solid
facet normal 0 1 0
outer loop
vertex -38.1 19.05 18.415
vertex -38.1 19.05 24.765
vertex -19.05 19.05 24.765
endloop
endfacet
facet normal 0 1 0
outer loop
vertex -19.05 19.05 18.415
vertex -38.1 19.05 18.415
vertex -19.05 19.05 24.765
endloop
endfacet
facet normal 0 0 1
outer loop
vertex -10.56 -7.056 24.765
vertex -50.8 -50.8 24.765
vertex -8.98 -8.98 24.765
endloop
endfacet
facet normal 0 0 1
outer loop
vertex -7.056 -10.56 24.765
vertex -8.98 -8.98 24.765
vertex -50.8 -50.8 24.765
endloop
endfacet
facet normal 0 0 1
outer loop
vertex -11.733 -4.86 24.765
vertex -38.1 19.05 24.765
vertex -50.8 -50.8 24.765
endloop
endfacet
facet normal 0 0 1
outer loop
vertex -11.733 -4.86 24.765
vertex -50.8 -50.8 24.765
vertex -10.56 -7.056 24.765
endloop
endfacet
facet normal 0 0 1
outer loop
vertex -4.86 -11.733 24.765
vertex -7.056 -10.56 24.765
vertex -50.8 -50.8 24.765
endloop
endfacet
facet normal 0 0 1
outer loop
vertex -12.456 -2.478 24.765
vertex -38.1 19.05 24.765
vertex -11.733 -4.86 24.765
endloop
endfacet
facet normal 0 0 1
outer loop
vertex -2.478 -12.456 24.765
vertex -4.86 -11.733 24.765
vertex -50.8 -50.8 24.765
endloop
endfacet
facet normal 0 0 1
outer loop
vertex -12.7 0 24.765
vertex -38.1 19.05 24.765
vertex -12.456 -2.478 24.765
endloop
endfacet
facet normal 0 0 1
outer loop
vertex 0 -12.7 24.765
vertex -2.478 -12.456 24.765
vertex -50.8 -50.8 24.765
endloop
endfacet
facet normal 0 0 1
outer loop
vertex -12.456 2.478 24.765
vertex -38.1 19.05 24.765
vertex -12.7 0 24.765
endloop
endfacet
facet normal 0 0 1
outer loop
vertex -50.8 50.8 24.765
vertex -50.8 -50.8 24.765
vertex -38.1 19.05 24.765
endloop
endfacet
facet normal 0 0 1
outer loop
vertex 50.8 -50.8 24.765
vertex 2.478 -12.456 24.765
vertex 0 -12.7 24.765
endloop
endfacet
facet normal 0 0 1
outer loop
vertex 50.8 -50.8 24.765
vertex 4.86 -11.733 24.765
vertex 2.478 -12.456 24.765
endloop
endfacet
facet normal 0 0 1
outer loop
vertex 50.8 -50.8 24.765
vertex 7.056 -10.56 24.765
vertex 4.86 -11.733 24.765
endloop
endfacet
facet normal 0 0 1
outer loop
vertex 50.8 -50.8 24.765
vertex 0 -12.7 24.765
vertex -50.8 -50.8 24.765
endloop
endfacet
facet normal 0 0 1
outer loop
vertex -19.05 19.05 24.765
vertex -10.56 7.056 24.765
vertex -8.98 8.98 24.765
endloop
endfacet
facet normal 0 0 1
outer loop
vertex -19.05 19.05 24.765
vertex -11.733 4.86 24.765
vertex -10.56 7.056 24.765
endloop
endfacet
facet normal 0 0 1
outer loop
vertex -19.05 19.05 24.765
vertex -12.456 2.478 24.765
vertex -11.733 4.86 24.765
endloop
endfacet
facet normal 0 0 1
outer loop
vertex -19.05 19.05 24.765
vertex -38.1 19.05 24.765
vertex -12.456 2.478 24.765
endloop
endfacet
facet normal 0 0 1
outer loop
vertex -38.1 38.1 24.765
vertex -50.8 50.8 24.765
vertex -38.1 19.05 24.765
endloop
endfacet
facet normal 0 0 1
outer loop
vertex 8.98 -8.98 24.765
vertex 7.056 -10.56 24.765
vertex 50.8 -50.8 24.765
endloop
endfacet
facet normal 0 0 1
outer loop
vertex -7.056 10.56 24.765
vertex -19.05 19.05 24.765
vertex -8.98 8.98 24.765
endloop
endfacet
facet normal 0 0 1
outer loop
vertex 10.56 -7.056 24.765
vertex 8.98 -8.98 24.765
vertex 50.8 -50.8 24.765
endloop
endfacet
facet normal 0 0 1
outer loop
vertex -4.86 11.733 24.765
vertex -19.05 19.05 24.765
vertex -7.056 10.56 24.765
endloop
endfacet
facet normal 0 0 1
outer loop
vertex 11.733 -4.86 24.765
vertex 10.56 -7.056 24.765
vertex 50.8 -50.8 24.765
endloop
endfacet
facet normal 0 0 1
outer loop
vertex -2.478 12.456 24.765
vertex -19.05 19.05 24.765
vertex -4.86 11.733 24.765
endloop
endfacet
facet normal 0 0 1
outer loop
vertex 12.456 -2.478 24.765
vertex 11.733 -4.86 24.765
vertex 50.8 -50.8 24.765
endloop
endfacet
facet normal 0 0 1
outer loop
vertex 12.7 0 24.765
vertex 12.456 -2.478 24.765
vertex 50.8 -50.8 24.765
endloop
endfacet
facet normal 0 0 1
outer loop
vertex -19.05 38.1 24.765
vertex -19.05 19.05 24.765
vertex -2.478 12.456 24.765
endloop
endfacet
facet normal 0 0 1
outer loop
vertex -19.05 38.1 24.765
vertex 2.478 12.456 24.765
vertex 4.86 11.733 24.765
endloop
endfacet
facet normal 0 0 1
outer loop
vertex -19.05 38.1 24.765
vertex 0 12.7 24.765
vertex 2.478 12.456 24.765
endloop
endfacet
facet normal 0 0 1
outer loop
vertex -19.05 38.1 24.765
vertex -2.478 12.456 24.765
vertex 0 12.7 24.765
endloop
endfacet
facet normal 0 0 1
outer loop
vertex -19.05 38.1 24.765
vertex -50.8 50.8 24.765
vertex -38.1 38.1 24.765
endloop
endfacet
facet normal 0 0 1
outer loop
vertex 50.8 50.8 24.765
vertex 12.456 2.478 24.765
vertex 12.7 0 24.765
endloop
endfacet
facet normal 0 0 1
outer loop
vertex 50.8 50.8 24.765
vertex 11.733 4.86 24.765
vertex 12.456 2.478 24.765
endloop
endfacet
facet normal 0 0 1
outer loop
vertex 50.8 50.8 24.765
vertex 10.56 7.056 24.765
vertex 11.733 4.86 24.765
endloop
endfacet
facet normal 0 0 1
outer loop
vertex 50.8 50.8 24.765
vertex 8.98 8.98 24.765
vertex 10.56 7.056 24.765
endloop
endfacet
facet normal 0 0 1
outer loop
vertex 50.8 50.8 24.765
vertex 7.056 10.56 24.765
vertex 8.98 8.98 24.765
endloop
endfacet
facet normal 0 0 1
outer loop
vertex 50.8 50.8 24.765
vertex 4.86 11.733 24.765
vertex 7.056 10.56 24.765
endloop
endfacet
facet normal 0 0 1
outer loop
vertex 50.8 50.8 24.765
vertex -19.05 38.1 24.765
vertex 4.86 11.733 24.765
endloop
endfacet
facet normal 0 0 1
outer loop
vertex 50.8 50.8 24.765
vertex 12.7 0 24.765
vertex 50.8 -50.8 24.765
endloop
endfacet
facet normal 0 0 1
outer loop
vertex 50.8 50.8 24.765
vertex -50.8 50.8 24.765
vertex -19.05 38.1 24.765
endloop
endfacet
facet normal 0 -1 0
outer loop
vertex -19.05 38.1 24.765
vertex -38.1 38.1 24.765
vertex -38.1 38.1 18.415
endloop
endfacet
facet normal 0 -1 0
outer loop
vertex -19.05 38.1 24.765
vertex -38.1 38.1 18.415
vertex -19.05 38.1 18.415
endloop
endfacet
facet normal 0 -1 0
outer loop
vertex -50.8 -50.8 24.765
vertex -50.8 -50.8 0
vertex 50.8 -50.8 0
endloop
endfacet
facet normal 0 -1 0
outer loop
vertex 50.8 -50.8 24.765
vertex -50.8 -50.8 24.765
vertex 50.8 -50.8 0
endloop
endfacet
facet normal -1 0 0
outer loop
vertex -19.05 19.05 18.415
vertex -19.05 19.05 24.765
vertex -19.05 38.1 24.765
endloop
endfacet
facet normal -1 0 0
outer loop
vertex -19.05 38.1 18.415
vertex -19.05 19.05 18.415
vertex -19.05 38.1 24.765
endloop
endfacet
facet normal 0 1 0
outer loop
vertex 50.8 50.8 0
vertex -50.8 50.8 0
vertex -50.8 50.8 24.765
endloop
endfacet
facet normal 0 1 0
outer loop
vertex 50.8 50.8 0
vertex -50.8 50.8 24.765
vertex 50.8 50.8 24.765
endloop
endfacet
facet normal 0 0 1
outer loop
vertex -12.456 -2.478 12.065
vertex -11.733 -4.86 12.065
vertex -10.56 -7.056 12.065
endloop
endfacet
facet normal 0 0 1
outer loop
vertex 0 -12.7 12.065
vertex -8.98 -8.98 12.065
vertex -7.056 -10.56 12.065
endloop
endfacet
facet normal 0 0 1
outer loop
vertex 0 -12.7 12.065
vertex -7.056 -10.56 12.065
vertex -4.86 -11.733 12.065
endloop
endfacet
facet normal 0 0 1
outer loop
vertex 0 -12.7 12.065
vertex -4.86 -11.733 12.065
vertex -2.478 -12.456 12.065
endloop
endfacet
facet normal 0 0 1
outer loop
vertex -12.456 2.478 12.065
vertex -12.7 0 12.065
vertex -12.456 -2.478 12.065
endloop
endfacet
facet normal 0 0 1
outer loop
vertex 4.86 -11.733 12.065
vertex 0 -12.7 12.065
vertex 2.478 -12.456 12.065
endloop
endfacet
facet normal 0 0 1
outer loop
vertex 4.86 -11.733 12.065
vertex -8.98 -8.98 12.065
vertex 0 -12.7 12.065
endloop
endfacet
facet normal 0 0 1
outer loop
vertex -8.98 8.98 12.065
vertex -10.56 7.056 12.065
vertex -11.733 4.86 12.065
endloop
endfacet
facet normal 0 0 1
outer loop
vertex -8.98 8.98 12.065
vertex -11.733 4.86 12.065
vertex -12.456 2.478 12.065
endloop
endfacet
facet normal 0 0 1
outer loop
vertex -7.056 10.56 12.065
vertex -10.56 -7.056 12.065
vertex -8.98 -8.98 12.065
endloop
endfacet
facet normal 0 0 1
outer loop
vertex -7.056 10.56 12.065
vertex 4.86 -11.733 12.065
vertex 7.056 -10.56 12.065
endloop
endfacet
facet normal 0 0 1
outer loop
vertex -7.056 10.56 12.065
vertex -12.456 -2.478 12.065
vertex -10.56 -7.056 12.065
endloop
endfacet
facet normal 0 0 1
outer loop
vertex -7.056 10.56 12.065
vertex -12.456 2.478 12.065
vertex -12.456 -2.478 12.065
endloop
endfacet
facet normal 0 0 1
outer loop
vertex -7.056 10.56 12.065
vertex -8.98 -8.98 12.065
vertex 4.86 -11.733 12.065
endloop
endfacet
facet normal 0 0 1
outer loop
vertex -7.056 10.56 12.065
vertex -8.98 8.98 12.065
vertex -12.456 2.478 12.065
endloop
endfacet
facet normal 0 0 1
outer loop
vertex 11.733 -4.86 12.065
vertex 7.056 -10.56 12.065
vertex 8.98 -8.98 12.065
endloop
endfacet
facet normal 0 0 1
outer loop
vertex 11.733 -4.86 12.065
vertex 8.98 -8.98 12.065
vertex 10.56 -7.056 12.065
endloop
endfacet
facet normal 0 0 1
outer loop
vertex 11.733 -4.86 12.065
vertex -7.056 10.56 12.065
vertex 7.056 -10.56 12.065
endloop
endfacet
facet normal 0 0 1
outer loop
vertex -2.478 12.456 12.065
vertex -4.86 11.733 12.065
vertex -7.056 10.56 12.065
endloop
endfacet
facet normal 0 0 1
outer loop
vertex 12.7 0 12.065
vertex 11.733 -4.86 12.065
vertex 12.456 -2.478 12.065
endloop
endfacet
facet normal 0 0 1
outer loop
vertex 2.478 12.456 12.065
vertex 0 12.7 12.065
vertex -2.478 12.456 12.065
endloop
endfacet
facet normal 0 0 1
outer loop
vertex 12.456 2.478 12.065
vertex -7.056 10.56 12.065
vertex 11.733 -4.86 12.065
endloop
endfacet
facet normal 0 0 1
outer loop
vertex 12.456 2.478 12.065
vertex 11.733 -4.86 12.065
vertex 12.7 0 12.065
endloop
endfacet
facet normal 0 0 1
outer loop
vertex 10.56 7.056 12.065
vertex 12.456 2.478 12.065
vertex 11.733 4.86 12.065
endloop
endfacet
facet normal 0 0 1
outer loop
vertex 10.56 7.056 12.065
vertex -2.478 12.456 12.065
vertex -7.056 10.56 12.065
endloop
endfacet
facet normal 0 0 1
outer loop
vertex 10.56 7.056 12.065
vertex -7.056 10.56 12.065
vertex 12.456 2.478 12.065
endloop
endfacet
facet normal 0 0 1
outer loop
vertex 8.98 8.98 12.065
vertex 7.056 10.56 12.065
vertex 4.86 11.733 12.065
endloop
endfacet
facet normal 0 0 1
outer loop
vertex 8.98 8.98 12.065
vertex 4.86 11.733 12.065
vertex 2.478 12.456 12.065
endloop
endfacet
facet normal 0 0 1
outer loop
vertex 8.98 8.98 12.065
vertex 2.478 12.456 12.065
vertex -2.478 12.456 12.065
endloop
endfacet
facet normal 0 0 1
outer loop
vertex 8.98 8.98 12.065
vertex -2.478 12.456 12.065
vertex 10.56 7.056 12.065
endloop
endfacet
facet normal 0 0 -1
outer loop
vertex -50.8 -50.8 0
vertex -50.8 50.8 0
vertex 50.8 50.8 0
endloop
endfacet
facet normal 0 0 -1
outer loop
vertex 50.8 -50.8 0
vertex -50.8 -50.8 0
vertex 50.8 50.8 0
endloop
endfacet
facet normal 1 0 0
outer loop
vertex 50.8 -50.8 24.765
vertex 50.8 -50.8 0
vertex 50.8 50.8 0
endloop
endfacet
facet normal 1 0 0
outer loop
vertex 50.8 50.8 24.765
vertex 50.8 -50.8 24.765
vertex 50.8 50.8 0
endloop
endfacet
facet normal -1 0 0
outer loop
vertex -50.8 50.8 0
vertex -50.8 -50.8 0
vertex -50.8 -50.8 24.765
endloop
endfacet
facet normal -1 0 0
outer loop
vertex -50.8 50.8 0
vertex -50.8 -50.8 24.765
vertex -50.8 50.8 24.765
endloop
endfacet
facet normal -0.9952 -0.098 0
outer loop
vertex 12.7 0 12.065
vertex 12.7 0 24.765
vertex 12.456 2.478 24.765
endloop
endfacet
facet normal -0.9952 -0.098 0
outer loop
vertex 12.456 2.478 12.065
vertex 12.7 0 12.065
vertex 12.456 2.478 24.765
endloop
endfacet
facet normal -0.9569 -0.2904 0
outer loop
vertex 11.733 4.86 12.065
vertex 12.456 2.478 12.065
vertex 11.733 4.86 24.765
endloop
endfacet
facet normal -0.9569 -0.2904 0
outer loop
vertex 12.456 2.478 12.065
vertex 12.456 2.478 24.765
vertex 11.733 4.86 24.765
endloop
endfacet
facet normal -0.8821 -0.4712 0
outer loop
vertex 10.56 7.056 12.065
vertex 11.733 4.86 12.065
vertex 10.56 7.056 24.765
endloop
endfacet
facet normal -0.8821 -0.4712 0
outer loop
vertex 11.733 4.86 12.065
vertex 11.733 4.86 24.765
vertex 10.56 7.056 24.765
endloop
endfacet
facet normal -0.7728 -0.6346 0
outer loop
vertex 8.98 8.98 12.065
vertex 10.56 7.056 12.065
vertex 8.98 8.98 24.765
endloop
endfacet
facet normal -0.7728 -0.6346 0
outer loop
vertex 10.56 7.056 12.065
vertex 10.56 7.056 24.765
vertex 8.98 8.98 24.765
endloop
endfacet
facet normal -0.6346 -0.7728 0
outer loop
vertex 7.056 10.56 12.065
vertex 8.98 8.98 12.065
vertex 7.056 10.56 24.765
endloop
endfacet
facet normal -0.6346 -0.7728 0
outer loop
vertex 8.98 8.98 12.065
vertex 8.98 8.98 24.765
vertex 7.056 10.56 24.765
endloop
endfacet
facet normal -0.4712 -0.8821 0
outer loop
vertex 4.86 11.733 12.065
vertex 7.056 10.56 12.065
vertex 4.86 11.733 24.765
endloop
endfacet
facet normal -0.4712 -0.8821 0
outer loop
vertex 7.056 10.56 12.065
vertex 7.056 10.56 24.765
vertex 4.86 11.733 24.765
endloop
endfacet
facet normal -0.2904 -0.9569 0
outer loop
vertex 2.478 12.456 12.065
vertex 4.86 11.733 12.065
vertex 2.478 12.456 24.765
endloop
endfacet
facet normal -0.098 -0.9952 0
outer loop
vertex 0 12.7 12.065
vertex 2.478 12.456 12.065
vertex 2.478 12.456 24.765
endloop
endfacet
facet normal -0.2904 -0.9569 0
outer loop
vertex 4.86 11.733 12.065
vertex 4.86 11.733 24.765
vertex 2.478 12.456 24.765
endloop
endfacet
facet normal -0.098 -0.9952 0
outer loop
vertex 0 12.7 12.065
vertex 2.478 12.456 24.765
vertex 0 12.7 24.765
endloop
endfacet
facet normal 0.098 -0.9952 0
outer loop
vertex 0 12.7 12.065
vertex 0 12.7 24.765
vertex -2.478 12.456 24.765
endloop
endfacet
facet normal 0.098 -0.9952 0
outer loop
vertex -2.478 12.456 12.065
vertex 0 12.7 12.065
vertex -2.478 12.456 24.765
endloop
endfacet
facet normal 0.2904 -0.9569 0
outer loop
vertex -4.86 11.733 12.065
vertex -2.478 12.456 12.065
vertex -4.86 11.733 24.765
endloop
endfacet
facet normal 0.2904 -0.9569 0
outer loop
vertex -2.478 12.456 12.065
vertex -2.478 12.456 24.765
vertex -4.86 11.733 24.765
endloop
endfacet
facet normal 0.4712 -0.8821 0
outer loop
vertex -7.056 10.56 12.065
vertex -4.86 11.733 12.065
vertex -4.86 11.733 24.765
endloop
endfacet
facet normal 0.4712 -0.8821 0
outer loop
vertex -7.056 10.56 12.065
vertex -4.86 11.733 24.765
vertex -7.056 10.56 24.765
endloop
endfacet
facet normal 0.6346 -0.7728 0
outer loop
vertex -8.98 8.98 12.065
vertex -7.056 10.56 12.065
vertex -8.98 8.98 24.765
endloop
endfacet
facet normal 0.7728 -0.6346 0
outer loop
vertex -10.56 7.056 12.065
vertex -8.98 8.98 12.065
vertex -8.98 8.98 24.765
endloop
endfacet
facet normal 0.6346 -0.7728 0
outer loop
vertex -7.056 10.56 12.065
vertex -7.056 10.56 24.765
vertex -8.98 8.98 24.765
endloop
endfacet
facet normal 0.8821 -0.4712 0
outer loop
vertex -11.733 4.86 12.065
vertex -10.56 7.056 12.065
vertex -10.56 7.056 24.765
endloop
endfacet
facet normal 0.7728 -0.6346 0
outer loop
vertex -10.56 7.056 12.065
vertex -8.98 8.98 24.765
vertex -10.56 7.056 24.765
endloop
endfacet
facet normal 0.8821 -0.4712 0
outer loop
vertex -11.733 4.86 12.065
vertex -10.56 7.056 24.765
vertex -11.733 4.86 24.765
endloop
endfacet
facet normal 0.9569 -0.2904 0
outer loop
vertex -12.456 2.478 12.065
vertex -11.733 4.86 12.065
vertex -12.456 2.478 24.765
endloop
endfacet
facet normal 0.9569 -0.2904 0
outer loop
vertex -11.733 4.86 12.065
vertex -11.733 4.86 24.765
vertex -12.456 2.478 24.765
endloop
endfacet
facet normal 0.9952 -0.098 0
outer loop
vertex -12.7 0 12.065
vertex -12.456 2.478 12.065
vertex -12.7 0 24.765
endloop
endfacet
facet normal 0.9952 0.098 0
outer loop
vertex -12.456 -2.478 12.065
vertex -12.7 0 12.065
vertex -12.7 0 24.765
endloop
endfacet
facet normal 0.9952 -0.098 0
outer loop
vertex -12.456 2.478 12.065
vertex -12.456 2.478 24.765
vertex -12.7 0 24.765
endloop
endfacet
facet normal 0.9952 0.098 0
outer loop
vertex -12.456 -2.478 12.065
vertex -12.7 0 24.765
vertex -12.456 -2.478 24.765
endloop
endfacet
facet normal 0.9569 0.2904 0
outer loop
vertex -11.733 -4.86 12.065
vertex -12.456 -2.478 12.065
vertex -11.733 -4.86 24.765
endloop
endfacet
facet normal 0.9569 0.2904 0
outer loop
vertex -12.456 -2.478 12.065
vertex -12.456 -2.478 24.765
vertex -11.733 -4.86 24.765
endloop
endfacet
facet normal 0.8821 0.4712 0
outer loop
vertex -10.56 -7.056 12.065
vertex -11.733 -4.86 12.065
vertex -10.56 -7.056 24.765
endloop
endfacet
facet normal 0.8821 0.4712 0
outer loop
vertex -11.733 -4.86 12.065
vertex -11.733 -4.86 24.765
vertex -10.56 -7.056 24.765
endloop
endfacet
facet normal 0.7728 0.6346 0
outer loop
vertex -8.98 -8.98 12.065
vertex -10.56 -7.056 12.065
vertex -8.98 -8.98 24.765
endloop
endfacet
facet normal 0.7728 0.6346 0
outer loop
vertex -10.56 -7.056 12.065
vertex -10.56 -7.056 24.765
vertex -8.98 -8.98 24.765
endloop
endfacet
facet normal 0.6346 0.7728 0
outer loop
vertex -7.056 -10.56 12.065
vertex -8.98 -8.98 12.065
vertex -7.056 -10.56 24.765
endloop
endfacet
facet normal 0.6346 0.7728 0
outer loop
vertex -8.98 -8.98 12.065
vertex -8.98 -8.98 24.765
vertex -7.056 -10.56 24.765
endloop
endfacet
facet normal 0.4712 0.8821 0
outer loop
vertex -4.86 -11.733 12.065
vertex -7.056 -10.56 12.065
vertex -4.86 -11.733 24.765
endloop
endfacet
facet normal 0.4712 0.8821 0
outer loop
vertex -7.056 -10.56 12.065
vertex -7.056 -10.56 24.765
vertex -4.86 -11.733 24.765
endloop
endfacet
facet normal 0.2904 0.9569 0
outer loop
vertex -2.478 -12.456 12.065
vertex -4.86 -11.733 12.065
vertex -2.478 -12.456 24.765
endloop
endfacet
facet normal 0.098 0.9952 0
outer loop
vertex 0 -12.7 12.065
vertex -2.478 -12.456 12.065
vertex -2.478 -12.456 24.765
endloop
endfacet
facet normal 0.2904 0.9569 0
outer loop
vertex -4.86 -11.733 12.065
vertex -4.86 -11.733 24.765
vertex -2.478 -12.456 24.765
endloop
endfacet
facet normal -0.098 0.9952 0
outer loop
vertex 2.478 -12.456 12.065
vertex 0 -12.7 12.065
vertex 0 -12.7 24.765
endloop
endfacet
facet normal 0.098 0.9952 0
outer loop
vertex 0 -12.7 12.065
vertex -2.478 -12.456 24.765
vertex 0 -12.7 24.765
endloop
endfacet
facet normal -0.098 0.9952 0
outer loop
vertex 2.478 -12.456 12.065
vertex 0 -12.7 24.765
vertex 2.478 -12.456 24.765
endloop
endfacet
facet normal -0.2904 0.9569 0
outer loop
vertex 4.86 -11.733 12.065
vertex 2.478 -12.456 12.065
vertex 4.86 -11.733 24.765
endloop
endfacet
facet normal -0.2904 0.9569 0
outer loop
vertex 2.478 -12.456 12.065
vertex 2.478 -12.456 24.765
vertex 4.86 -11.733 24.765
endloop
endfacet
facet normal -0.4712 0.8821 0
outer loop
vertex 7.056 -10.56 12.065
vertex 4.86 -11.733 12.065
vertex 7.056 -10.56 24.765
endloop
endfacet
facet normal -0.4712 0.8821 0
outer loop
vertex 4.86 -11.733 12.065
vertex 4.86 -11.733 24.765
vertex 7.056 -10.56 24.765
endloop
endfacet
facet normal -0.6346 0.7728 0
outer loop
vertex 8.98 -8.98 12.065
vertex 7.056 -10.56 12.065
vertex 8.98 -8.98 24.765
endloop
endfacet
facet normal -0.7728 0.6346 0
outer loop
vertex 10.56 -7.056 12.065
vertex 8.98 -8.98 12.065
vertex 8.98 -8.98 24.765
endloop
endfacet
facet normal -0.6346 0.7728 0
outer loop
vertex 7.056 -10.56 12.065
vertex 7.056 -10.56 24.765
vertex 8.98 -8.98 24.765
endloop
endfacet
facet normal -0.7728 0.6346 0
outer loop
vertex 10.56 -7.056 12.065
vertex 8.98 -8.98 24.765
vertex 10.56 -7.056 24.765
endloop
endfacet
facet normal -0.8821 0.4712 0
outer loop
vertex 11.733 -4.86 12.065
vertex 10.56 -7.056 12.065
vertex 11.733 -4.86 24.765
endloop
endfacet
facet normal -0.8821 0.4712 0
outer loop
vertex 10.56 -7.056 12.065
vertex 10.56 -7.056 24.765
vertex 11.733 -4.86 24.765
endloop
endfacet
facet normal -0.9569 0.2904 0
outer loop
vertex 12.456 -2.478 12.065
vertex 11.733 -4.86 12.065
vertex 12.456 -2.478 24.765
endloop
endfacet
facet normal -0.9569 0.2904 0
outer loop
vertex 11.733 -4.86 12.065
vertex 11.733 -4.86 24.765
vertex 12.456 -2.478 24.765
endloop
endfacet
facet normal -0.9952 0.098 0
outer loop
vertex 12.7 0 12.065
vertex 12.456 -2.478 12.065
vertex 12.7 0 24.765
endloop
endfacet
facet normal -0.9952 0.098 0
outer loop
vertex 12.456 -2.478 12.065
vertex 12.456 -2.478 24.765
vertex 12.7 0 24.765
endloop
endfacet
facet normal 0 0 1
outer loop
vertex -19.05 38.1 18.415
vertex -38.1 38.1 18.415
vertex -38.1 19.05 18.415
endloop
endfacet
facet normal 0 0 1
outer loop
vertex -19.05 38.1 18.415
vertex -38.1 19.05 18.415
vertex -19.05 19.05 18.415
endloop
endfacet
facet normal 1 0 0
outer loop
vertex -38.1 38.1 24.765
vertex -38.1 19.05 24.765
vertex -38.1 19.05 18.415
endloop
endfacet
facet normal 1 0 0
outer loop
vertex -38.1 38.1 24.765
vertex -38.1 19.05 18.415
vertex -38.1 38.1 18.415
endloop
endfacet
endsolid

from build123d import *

# Parameters (mm, degrees)
F0_W     = 101.6
F0_H     = 101.6
F1_DEPTH = 24.765
F2_W     = 19.05
F2_H     = 19.05
F3_DEPTH = 6.35
F2_R     = 12.7
F4_DEPTH = 12.7


with BuildPart() as f1:
    # F0 (on Top) → F1 (new body)
    with BuildSketch(Plane.XY):
        Rectangle(F0_W, F0_H)
    extrude(amount=F1_DEPTH)

    # F2 (on face) → F3 (cut)
    with BuildSketch(Plane.XY.offset(24.765)):
        with Locations((-28.575, 28.575)):
            Rectangle(F2_W, F2_H)
    extrude(amount=-F3_DEPTH, mode=Mode.SUBTRACT)

    # F2 (on face) → F4 (cut)
    with BuildSketch(Plane.XY.offset(24.765)):
        Circle(F2_R)
    extrude(amount=-F4_DEPTH, mode=Mode.SUBTRACT)


solid = f1.part
